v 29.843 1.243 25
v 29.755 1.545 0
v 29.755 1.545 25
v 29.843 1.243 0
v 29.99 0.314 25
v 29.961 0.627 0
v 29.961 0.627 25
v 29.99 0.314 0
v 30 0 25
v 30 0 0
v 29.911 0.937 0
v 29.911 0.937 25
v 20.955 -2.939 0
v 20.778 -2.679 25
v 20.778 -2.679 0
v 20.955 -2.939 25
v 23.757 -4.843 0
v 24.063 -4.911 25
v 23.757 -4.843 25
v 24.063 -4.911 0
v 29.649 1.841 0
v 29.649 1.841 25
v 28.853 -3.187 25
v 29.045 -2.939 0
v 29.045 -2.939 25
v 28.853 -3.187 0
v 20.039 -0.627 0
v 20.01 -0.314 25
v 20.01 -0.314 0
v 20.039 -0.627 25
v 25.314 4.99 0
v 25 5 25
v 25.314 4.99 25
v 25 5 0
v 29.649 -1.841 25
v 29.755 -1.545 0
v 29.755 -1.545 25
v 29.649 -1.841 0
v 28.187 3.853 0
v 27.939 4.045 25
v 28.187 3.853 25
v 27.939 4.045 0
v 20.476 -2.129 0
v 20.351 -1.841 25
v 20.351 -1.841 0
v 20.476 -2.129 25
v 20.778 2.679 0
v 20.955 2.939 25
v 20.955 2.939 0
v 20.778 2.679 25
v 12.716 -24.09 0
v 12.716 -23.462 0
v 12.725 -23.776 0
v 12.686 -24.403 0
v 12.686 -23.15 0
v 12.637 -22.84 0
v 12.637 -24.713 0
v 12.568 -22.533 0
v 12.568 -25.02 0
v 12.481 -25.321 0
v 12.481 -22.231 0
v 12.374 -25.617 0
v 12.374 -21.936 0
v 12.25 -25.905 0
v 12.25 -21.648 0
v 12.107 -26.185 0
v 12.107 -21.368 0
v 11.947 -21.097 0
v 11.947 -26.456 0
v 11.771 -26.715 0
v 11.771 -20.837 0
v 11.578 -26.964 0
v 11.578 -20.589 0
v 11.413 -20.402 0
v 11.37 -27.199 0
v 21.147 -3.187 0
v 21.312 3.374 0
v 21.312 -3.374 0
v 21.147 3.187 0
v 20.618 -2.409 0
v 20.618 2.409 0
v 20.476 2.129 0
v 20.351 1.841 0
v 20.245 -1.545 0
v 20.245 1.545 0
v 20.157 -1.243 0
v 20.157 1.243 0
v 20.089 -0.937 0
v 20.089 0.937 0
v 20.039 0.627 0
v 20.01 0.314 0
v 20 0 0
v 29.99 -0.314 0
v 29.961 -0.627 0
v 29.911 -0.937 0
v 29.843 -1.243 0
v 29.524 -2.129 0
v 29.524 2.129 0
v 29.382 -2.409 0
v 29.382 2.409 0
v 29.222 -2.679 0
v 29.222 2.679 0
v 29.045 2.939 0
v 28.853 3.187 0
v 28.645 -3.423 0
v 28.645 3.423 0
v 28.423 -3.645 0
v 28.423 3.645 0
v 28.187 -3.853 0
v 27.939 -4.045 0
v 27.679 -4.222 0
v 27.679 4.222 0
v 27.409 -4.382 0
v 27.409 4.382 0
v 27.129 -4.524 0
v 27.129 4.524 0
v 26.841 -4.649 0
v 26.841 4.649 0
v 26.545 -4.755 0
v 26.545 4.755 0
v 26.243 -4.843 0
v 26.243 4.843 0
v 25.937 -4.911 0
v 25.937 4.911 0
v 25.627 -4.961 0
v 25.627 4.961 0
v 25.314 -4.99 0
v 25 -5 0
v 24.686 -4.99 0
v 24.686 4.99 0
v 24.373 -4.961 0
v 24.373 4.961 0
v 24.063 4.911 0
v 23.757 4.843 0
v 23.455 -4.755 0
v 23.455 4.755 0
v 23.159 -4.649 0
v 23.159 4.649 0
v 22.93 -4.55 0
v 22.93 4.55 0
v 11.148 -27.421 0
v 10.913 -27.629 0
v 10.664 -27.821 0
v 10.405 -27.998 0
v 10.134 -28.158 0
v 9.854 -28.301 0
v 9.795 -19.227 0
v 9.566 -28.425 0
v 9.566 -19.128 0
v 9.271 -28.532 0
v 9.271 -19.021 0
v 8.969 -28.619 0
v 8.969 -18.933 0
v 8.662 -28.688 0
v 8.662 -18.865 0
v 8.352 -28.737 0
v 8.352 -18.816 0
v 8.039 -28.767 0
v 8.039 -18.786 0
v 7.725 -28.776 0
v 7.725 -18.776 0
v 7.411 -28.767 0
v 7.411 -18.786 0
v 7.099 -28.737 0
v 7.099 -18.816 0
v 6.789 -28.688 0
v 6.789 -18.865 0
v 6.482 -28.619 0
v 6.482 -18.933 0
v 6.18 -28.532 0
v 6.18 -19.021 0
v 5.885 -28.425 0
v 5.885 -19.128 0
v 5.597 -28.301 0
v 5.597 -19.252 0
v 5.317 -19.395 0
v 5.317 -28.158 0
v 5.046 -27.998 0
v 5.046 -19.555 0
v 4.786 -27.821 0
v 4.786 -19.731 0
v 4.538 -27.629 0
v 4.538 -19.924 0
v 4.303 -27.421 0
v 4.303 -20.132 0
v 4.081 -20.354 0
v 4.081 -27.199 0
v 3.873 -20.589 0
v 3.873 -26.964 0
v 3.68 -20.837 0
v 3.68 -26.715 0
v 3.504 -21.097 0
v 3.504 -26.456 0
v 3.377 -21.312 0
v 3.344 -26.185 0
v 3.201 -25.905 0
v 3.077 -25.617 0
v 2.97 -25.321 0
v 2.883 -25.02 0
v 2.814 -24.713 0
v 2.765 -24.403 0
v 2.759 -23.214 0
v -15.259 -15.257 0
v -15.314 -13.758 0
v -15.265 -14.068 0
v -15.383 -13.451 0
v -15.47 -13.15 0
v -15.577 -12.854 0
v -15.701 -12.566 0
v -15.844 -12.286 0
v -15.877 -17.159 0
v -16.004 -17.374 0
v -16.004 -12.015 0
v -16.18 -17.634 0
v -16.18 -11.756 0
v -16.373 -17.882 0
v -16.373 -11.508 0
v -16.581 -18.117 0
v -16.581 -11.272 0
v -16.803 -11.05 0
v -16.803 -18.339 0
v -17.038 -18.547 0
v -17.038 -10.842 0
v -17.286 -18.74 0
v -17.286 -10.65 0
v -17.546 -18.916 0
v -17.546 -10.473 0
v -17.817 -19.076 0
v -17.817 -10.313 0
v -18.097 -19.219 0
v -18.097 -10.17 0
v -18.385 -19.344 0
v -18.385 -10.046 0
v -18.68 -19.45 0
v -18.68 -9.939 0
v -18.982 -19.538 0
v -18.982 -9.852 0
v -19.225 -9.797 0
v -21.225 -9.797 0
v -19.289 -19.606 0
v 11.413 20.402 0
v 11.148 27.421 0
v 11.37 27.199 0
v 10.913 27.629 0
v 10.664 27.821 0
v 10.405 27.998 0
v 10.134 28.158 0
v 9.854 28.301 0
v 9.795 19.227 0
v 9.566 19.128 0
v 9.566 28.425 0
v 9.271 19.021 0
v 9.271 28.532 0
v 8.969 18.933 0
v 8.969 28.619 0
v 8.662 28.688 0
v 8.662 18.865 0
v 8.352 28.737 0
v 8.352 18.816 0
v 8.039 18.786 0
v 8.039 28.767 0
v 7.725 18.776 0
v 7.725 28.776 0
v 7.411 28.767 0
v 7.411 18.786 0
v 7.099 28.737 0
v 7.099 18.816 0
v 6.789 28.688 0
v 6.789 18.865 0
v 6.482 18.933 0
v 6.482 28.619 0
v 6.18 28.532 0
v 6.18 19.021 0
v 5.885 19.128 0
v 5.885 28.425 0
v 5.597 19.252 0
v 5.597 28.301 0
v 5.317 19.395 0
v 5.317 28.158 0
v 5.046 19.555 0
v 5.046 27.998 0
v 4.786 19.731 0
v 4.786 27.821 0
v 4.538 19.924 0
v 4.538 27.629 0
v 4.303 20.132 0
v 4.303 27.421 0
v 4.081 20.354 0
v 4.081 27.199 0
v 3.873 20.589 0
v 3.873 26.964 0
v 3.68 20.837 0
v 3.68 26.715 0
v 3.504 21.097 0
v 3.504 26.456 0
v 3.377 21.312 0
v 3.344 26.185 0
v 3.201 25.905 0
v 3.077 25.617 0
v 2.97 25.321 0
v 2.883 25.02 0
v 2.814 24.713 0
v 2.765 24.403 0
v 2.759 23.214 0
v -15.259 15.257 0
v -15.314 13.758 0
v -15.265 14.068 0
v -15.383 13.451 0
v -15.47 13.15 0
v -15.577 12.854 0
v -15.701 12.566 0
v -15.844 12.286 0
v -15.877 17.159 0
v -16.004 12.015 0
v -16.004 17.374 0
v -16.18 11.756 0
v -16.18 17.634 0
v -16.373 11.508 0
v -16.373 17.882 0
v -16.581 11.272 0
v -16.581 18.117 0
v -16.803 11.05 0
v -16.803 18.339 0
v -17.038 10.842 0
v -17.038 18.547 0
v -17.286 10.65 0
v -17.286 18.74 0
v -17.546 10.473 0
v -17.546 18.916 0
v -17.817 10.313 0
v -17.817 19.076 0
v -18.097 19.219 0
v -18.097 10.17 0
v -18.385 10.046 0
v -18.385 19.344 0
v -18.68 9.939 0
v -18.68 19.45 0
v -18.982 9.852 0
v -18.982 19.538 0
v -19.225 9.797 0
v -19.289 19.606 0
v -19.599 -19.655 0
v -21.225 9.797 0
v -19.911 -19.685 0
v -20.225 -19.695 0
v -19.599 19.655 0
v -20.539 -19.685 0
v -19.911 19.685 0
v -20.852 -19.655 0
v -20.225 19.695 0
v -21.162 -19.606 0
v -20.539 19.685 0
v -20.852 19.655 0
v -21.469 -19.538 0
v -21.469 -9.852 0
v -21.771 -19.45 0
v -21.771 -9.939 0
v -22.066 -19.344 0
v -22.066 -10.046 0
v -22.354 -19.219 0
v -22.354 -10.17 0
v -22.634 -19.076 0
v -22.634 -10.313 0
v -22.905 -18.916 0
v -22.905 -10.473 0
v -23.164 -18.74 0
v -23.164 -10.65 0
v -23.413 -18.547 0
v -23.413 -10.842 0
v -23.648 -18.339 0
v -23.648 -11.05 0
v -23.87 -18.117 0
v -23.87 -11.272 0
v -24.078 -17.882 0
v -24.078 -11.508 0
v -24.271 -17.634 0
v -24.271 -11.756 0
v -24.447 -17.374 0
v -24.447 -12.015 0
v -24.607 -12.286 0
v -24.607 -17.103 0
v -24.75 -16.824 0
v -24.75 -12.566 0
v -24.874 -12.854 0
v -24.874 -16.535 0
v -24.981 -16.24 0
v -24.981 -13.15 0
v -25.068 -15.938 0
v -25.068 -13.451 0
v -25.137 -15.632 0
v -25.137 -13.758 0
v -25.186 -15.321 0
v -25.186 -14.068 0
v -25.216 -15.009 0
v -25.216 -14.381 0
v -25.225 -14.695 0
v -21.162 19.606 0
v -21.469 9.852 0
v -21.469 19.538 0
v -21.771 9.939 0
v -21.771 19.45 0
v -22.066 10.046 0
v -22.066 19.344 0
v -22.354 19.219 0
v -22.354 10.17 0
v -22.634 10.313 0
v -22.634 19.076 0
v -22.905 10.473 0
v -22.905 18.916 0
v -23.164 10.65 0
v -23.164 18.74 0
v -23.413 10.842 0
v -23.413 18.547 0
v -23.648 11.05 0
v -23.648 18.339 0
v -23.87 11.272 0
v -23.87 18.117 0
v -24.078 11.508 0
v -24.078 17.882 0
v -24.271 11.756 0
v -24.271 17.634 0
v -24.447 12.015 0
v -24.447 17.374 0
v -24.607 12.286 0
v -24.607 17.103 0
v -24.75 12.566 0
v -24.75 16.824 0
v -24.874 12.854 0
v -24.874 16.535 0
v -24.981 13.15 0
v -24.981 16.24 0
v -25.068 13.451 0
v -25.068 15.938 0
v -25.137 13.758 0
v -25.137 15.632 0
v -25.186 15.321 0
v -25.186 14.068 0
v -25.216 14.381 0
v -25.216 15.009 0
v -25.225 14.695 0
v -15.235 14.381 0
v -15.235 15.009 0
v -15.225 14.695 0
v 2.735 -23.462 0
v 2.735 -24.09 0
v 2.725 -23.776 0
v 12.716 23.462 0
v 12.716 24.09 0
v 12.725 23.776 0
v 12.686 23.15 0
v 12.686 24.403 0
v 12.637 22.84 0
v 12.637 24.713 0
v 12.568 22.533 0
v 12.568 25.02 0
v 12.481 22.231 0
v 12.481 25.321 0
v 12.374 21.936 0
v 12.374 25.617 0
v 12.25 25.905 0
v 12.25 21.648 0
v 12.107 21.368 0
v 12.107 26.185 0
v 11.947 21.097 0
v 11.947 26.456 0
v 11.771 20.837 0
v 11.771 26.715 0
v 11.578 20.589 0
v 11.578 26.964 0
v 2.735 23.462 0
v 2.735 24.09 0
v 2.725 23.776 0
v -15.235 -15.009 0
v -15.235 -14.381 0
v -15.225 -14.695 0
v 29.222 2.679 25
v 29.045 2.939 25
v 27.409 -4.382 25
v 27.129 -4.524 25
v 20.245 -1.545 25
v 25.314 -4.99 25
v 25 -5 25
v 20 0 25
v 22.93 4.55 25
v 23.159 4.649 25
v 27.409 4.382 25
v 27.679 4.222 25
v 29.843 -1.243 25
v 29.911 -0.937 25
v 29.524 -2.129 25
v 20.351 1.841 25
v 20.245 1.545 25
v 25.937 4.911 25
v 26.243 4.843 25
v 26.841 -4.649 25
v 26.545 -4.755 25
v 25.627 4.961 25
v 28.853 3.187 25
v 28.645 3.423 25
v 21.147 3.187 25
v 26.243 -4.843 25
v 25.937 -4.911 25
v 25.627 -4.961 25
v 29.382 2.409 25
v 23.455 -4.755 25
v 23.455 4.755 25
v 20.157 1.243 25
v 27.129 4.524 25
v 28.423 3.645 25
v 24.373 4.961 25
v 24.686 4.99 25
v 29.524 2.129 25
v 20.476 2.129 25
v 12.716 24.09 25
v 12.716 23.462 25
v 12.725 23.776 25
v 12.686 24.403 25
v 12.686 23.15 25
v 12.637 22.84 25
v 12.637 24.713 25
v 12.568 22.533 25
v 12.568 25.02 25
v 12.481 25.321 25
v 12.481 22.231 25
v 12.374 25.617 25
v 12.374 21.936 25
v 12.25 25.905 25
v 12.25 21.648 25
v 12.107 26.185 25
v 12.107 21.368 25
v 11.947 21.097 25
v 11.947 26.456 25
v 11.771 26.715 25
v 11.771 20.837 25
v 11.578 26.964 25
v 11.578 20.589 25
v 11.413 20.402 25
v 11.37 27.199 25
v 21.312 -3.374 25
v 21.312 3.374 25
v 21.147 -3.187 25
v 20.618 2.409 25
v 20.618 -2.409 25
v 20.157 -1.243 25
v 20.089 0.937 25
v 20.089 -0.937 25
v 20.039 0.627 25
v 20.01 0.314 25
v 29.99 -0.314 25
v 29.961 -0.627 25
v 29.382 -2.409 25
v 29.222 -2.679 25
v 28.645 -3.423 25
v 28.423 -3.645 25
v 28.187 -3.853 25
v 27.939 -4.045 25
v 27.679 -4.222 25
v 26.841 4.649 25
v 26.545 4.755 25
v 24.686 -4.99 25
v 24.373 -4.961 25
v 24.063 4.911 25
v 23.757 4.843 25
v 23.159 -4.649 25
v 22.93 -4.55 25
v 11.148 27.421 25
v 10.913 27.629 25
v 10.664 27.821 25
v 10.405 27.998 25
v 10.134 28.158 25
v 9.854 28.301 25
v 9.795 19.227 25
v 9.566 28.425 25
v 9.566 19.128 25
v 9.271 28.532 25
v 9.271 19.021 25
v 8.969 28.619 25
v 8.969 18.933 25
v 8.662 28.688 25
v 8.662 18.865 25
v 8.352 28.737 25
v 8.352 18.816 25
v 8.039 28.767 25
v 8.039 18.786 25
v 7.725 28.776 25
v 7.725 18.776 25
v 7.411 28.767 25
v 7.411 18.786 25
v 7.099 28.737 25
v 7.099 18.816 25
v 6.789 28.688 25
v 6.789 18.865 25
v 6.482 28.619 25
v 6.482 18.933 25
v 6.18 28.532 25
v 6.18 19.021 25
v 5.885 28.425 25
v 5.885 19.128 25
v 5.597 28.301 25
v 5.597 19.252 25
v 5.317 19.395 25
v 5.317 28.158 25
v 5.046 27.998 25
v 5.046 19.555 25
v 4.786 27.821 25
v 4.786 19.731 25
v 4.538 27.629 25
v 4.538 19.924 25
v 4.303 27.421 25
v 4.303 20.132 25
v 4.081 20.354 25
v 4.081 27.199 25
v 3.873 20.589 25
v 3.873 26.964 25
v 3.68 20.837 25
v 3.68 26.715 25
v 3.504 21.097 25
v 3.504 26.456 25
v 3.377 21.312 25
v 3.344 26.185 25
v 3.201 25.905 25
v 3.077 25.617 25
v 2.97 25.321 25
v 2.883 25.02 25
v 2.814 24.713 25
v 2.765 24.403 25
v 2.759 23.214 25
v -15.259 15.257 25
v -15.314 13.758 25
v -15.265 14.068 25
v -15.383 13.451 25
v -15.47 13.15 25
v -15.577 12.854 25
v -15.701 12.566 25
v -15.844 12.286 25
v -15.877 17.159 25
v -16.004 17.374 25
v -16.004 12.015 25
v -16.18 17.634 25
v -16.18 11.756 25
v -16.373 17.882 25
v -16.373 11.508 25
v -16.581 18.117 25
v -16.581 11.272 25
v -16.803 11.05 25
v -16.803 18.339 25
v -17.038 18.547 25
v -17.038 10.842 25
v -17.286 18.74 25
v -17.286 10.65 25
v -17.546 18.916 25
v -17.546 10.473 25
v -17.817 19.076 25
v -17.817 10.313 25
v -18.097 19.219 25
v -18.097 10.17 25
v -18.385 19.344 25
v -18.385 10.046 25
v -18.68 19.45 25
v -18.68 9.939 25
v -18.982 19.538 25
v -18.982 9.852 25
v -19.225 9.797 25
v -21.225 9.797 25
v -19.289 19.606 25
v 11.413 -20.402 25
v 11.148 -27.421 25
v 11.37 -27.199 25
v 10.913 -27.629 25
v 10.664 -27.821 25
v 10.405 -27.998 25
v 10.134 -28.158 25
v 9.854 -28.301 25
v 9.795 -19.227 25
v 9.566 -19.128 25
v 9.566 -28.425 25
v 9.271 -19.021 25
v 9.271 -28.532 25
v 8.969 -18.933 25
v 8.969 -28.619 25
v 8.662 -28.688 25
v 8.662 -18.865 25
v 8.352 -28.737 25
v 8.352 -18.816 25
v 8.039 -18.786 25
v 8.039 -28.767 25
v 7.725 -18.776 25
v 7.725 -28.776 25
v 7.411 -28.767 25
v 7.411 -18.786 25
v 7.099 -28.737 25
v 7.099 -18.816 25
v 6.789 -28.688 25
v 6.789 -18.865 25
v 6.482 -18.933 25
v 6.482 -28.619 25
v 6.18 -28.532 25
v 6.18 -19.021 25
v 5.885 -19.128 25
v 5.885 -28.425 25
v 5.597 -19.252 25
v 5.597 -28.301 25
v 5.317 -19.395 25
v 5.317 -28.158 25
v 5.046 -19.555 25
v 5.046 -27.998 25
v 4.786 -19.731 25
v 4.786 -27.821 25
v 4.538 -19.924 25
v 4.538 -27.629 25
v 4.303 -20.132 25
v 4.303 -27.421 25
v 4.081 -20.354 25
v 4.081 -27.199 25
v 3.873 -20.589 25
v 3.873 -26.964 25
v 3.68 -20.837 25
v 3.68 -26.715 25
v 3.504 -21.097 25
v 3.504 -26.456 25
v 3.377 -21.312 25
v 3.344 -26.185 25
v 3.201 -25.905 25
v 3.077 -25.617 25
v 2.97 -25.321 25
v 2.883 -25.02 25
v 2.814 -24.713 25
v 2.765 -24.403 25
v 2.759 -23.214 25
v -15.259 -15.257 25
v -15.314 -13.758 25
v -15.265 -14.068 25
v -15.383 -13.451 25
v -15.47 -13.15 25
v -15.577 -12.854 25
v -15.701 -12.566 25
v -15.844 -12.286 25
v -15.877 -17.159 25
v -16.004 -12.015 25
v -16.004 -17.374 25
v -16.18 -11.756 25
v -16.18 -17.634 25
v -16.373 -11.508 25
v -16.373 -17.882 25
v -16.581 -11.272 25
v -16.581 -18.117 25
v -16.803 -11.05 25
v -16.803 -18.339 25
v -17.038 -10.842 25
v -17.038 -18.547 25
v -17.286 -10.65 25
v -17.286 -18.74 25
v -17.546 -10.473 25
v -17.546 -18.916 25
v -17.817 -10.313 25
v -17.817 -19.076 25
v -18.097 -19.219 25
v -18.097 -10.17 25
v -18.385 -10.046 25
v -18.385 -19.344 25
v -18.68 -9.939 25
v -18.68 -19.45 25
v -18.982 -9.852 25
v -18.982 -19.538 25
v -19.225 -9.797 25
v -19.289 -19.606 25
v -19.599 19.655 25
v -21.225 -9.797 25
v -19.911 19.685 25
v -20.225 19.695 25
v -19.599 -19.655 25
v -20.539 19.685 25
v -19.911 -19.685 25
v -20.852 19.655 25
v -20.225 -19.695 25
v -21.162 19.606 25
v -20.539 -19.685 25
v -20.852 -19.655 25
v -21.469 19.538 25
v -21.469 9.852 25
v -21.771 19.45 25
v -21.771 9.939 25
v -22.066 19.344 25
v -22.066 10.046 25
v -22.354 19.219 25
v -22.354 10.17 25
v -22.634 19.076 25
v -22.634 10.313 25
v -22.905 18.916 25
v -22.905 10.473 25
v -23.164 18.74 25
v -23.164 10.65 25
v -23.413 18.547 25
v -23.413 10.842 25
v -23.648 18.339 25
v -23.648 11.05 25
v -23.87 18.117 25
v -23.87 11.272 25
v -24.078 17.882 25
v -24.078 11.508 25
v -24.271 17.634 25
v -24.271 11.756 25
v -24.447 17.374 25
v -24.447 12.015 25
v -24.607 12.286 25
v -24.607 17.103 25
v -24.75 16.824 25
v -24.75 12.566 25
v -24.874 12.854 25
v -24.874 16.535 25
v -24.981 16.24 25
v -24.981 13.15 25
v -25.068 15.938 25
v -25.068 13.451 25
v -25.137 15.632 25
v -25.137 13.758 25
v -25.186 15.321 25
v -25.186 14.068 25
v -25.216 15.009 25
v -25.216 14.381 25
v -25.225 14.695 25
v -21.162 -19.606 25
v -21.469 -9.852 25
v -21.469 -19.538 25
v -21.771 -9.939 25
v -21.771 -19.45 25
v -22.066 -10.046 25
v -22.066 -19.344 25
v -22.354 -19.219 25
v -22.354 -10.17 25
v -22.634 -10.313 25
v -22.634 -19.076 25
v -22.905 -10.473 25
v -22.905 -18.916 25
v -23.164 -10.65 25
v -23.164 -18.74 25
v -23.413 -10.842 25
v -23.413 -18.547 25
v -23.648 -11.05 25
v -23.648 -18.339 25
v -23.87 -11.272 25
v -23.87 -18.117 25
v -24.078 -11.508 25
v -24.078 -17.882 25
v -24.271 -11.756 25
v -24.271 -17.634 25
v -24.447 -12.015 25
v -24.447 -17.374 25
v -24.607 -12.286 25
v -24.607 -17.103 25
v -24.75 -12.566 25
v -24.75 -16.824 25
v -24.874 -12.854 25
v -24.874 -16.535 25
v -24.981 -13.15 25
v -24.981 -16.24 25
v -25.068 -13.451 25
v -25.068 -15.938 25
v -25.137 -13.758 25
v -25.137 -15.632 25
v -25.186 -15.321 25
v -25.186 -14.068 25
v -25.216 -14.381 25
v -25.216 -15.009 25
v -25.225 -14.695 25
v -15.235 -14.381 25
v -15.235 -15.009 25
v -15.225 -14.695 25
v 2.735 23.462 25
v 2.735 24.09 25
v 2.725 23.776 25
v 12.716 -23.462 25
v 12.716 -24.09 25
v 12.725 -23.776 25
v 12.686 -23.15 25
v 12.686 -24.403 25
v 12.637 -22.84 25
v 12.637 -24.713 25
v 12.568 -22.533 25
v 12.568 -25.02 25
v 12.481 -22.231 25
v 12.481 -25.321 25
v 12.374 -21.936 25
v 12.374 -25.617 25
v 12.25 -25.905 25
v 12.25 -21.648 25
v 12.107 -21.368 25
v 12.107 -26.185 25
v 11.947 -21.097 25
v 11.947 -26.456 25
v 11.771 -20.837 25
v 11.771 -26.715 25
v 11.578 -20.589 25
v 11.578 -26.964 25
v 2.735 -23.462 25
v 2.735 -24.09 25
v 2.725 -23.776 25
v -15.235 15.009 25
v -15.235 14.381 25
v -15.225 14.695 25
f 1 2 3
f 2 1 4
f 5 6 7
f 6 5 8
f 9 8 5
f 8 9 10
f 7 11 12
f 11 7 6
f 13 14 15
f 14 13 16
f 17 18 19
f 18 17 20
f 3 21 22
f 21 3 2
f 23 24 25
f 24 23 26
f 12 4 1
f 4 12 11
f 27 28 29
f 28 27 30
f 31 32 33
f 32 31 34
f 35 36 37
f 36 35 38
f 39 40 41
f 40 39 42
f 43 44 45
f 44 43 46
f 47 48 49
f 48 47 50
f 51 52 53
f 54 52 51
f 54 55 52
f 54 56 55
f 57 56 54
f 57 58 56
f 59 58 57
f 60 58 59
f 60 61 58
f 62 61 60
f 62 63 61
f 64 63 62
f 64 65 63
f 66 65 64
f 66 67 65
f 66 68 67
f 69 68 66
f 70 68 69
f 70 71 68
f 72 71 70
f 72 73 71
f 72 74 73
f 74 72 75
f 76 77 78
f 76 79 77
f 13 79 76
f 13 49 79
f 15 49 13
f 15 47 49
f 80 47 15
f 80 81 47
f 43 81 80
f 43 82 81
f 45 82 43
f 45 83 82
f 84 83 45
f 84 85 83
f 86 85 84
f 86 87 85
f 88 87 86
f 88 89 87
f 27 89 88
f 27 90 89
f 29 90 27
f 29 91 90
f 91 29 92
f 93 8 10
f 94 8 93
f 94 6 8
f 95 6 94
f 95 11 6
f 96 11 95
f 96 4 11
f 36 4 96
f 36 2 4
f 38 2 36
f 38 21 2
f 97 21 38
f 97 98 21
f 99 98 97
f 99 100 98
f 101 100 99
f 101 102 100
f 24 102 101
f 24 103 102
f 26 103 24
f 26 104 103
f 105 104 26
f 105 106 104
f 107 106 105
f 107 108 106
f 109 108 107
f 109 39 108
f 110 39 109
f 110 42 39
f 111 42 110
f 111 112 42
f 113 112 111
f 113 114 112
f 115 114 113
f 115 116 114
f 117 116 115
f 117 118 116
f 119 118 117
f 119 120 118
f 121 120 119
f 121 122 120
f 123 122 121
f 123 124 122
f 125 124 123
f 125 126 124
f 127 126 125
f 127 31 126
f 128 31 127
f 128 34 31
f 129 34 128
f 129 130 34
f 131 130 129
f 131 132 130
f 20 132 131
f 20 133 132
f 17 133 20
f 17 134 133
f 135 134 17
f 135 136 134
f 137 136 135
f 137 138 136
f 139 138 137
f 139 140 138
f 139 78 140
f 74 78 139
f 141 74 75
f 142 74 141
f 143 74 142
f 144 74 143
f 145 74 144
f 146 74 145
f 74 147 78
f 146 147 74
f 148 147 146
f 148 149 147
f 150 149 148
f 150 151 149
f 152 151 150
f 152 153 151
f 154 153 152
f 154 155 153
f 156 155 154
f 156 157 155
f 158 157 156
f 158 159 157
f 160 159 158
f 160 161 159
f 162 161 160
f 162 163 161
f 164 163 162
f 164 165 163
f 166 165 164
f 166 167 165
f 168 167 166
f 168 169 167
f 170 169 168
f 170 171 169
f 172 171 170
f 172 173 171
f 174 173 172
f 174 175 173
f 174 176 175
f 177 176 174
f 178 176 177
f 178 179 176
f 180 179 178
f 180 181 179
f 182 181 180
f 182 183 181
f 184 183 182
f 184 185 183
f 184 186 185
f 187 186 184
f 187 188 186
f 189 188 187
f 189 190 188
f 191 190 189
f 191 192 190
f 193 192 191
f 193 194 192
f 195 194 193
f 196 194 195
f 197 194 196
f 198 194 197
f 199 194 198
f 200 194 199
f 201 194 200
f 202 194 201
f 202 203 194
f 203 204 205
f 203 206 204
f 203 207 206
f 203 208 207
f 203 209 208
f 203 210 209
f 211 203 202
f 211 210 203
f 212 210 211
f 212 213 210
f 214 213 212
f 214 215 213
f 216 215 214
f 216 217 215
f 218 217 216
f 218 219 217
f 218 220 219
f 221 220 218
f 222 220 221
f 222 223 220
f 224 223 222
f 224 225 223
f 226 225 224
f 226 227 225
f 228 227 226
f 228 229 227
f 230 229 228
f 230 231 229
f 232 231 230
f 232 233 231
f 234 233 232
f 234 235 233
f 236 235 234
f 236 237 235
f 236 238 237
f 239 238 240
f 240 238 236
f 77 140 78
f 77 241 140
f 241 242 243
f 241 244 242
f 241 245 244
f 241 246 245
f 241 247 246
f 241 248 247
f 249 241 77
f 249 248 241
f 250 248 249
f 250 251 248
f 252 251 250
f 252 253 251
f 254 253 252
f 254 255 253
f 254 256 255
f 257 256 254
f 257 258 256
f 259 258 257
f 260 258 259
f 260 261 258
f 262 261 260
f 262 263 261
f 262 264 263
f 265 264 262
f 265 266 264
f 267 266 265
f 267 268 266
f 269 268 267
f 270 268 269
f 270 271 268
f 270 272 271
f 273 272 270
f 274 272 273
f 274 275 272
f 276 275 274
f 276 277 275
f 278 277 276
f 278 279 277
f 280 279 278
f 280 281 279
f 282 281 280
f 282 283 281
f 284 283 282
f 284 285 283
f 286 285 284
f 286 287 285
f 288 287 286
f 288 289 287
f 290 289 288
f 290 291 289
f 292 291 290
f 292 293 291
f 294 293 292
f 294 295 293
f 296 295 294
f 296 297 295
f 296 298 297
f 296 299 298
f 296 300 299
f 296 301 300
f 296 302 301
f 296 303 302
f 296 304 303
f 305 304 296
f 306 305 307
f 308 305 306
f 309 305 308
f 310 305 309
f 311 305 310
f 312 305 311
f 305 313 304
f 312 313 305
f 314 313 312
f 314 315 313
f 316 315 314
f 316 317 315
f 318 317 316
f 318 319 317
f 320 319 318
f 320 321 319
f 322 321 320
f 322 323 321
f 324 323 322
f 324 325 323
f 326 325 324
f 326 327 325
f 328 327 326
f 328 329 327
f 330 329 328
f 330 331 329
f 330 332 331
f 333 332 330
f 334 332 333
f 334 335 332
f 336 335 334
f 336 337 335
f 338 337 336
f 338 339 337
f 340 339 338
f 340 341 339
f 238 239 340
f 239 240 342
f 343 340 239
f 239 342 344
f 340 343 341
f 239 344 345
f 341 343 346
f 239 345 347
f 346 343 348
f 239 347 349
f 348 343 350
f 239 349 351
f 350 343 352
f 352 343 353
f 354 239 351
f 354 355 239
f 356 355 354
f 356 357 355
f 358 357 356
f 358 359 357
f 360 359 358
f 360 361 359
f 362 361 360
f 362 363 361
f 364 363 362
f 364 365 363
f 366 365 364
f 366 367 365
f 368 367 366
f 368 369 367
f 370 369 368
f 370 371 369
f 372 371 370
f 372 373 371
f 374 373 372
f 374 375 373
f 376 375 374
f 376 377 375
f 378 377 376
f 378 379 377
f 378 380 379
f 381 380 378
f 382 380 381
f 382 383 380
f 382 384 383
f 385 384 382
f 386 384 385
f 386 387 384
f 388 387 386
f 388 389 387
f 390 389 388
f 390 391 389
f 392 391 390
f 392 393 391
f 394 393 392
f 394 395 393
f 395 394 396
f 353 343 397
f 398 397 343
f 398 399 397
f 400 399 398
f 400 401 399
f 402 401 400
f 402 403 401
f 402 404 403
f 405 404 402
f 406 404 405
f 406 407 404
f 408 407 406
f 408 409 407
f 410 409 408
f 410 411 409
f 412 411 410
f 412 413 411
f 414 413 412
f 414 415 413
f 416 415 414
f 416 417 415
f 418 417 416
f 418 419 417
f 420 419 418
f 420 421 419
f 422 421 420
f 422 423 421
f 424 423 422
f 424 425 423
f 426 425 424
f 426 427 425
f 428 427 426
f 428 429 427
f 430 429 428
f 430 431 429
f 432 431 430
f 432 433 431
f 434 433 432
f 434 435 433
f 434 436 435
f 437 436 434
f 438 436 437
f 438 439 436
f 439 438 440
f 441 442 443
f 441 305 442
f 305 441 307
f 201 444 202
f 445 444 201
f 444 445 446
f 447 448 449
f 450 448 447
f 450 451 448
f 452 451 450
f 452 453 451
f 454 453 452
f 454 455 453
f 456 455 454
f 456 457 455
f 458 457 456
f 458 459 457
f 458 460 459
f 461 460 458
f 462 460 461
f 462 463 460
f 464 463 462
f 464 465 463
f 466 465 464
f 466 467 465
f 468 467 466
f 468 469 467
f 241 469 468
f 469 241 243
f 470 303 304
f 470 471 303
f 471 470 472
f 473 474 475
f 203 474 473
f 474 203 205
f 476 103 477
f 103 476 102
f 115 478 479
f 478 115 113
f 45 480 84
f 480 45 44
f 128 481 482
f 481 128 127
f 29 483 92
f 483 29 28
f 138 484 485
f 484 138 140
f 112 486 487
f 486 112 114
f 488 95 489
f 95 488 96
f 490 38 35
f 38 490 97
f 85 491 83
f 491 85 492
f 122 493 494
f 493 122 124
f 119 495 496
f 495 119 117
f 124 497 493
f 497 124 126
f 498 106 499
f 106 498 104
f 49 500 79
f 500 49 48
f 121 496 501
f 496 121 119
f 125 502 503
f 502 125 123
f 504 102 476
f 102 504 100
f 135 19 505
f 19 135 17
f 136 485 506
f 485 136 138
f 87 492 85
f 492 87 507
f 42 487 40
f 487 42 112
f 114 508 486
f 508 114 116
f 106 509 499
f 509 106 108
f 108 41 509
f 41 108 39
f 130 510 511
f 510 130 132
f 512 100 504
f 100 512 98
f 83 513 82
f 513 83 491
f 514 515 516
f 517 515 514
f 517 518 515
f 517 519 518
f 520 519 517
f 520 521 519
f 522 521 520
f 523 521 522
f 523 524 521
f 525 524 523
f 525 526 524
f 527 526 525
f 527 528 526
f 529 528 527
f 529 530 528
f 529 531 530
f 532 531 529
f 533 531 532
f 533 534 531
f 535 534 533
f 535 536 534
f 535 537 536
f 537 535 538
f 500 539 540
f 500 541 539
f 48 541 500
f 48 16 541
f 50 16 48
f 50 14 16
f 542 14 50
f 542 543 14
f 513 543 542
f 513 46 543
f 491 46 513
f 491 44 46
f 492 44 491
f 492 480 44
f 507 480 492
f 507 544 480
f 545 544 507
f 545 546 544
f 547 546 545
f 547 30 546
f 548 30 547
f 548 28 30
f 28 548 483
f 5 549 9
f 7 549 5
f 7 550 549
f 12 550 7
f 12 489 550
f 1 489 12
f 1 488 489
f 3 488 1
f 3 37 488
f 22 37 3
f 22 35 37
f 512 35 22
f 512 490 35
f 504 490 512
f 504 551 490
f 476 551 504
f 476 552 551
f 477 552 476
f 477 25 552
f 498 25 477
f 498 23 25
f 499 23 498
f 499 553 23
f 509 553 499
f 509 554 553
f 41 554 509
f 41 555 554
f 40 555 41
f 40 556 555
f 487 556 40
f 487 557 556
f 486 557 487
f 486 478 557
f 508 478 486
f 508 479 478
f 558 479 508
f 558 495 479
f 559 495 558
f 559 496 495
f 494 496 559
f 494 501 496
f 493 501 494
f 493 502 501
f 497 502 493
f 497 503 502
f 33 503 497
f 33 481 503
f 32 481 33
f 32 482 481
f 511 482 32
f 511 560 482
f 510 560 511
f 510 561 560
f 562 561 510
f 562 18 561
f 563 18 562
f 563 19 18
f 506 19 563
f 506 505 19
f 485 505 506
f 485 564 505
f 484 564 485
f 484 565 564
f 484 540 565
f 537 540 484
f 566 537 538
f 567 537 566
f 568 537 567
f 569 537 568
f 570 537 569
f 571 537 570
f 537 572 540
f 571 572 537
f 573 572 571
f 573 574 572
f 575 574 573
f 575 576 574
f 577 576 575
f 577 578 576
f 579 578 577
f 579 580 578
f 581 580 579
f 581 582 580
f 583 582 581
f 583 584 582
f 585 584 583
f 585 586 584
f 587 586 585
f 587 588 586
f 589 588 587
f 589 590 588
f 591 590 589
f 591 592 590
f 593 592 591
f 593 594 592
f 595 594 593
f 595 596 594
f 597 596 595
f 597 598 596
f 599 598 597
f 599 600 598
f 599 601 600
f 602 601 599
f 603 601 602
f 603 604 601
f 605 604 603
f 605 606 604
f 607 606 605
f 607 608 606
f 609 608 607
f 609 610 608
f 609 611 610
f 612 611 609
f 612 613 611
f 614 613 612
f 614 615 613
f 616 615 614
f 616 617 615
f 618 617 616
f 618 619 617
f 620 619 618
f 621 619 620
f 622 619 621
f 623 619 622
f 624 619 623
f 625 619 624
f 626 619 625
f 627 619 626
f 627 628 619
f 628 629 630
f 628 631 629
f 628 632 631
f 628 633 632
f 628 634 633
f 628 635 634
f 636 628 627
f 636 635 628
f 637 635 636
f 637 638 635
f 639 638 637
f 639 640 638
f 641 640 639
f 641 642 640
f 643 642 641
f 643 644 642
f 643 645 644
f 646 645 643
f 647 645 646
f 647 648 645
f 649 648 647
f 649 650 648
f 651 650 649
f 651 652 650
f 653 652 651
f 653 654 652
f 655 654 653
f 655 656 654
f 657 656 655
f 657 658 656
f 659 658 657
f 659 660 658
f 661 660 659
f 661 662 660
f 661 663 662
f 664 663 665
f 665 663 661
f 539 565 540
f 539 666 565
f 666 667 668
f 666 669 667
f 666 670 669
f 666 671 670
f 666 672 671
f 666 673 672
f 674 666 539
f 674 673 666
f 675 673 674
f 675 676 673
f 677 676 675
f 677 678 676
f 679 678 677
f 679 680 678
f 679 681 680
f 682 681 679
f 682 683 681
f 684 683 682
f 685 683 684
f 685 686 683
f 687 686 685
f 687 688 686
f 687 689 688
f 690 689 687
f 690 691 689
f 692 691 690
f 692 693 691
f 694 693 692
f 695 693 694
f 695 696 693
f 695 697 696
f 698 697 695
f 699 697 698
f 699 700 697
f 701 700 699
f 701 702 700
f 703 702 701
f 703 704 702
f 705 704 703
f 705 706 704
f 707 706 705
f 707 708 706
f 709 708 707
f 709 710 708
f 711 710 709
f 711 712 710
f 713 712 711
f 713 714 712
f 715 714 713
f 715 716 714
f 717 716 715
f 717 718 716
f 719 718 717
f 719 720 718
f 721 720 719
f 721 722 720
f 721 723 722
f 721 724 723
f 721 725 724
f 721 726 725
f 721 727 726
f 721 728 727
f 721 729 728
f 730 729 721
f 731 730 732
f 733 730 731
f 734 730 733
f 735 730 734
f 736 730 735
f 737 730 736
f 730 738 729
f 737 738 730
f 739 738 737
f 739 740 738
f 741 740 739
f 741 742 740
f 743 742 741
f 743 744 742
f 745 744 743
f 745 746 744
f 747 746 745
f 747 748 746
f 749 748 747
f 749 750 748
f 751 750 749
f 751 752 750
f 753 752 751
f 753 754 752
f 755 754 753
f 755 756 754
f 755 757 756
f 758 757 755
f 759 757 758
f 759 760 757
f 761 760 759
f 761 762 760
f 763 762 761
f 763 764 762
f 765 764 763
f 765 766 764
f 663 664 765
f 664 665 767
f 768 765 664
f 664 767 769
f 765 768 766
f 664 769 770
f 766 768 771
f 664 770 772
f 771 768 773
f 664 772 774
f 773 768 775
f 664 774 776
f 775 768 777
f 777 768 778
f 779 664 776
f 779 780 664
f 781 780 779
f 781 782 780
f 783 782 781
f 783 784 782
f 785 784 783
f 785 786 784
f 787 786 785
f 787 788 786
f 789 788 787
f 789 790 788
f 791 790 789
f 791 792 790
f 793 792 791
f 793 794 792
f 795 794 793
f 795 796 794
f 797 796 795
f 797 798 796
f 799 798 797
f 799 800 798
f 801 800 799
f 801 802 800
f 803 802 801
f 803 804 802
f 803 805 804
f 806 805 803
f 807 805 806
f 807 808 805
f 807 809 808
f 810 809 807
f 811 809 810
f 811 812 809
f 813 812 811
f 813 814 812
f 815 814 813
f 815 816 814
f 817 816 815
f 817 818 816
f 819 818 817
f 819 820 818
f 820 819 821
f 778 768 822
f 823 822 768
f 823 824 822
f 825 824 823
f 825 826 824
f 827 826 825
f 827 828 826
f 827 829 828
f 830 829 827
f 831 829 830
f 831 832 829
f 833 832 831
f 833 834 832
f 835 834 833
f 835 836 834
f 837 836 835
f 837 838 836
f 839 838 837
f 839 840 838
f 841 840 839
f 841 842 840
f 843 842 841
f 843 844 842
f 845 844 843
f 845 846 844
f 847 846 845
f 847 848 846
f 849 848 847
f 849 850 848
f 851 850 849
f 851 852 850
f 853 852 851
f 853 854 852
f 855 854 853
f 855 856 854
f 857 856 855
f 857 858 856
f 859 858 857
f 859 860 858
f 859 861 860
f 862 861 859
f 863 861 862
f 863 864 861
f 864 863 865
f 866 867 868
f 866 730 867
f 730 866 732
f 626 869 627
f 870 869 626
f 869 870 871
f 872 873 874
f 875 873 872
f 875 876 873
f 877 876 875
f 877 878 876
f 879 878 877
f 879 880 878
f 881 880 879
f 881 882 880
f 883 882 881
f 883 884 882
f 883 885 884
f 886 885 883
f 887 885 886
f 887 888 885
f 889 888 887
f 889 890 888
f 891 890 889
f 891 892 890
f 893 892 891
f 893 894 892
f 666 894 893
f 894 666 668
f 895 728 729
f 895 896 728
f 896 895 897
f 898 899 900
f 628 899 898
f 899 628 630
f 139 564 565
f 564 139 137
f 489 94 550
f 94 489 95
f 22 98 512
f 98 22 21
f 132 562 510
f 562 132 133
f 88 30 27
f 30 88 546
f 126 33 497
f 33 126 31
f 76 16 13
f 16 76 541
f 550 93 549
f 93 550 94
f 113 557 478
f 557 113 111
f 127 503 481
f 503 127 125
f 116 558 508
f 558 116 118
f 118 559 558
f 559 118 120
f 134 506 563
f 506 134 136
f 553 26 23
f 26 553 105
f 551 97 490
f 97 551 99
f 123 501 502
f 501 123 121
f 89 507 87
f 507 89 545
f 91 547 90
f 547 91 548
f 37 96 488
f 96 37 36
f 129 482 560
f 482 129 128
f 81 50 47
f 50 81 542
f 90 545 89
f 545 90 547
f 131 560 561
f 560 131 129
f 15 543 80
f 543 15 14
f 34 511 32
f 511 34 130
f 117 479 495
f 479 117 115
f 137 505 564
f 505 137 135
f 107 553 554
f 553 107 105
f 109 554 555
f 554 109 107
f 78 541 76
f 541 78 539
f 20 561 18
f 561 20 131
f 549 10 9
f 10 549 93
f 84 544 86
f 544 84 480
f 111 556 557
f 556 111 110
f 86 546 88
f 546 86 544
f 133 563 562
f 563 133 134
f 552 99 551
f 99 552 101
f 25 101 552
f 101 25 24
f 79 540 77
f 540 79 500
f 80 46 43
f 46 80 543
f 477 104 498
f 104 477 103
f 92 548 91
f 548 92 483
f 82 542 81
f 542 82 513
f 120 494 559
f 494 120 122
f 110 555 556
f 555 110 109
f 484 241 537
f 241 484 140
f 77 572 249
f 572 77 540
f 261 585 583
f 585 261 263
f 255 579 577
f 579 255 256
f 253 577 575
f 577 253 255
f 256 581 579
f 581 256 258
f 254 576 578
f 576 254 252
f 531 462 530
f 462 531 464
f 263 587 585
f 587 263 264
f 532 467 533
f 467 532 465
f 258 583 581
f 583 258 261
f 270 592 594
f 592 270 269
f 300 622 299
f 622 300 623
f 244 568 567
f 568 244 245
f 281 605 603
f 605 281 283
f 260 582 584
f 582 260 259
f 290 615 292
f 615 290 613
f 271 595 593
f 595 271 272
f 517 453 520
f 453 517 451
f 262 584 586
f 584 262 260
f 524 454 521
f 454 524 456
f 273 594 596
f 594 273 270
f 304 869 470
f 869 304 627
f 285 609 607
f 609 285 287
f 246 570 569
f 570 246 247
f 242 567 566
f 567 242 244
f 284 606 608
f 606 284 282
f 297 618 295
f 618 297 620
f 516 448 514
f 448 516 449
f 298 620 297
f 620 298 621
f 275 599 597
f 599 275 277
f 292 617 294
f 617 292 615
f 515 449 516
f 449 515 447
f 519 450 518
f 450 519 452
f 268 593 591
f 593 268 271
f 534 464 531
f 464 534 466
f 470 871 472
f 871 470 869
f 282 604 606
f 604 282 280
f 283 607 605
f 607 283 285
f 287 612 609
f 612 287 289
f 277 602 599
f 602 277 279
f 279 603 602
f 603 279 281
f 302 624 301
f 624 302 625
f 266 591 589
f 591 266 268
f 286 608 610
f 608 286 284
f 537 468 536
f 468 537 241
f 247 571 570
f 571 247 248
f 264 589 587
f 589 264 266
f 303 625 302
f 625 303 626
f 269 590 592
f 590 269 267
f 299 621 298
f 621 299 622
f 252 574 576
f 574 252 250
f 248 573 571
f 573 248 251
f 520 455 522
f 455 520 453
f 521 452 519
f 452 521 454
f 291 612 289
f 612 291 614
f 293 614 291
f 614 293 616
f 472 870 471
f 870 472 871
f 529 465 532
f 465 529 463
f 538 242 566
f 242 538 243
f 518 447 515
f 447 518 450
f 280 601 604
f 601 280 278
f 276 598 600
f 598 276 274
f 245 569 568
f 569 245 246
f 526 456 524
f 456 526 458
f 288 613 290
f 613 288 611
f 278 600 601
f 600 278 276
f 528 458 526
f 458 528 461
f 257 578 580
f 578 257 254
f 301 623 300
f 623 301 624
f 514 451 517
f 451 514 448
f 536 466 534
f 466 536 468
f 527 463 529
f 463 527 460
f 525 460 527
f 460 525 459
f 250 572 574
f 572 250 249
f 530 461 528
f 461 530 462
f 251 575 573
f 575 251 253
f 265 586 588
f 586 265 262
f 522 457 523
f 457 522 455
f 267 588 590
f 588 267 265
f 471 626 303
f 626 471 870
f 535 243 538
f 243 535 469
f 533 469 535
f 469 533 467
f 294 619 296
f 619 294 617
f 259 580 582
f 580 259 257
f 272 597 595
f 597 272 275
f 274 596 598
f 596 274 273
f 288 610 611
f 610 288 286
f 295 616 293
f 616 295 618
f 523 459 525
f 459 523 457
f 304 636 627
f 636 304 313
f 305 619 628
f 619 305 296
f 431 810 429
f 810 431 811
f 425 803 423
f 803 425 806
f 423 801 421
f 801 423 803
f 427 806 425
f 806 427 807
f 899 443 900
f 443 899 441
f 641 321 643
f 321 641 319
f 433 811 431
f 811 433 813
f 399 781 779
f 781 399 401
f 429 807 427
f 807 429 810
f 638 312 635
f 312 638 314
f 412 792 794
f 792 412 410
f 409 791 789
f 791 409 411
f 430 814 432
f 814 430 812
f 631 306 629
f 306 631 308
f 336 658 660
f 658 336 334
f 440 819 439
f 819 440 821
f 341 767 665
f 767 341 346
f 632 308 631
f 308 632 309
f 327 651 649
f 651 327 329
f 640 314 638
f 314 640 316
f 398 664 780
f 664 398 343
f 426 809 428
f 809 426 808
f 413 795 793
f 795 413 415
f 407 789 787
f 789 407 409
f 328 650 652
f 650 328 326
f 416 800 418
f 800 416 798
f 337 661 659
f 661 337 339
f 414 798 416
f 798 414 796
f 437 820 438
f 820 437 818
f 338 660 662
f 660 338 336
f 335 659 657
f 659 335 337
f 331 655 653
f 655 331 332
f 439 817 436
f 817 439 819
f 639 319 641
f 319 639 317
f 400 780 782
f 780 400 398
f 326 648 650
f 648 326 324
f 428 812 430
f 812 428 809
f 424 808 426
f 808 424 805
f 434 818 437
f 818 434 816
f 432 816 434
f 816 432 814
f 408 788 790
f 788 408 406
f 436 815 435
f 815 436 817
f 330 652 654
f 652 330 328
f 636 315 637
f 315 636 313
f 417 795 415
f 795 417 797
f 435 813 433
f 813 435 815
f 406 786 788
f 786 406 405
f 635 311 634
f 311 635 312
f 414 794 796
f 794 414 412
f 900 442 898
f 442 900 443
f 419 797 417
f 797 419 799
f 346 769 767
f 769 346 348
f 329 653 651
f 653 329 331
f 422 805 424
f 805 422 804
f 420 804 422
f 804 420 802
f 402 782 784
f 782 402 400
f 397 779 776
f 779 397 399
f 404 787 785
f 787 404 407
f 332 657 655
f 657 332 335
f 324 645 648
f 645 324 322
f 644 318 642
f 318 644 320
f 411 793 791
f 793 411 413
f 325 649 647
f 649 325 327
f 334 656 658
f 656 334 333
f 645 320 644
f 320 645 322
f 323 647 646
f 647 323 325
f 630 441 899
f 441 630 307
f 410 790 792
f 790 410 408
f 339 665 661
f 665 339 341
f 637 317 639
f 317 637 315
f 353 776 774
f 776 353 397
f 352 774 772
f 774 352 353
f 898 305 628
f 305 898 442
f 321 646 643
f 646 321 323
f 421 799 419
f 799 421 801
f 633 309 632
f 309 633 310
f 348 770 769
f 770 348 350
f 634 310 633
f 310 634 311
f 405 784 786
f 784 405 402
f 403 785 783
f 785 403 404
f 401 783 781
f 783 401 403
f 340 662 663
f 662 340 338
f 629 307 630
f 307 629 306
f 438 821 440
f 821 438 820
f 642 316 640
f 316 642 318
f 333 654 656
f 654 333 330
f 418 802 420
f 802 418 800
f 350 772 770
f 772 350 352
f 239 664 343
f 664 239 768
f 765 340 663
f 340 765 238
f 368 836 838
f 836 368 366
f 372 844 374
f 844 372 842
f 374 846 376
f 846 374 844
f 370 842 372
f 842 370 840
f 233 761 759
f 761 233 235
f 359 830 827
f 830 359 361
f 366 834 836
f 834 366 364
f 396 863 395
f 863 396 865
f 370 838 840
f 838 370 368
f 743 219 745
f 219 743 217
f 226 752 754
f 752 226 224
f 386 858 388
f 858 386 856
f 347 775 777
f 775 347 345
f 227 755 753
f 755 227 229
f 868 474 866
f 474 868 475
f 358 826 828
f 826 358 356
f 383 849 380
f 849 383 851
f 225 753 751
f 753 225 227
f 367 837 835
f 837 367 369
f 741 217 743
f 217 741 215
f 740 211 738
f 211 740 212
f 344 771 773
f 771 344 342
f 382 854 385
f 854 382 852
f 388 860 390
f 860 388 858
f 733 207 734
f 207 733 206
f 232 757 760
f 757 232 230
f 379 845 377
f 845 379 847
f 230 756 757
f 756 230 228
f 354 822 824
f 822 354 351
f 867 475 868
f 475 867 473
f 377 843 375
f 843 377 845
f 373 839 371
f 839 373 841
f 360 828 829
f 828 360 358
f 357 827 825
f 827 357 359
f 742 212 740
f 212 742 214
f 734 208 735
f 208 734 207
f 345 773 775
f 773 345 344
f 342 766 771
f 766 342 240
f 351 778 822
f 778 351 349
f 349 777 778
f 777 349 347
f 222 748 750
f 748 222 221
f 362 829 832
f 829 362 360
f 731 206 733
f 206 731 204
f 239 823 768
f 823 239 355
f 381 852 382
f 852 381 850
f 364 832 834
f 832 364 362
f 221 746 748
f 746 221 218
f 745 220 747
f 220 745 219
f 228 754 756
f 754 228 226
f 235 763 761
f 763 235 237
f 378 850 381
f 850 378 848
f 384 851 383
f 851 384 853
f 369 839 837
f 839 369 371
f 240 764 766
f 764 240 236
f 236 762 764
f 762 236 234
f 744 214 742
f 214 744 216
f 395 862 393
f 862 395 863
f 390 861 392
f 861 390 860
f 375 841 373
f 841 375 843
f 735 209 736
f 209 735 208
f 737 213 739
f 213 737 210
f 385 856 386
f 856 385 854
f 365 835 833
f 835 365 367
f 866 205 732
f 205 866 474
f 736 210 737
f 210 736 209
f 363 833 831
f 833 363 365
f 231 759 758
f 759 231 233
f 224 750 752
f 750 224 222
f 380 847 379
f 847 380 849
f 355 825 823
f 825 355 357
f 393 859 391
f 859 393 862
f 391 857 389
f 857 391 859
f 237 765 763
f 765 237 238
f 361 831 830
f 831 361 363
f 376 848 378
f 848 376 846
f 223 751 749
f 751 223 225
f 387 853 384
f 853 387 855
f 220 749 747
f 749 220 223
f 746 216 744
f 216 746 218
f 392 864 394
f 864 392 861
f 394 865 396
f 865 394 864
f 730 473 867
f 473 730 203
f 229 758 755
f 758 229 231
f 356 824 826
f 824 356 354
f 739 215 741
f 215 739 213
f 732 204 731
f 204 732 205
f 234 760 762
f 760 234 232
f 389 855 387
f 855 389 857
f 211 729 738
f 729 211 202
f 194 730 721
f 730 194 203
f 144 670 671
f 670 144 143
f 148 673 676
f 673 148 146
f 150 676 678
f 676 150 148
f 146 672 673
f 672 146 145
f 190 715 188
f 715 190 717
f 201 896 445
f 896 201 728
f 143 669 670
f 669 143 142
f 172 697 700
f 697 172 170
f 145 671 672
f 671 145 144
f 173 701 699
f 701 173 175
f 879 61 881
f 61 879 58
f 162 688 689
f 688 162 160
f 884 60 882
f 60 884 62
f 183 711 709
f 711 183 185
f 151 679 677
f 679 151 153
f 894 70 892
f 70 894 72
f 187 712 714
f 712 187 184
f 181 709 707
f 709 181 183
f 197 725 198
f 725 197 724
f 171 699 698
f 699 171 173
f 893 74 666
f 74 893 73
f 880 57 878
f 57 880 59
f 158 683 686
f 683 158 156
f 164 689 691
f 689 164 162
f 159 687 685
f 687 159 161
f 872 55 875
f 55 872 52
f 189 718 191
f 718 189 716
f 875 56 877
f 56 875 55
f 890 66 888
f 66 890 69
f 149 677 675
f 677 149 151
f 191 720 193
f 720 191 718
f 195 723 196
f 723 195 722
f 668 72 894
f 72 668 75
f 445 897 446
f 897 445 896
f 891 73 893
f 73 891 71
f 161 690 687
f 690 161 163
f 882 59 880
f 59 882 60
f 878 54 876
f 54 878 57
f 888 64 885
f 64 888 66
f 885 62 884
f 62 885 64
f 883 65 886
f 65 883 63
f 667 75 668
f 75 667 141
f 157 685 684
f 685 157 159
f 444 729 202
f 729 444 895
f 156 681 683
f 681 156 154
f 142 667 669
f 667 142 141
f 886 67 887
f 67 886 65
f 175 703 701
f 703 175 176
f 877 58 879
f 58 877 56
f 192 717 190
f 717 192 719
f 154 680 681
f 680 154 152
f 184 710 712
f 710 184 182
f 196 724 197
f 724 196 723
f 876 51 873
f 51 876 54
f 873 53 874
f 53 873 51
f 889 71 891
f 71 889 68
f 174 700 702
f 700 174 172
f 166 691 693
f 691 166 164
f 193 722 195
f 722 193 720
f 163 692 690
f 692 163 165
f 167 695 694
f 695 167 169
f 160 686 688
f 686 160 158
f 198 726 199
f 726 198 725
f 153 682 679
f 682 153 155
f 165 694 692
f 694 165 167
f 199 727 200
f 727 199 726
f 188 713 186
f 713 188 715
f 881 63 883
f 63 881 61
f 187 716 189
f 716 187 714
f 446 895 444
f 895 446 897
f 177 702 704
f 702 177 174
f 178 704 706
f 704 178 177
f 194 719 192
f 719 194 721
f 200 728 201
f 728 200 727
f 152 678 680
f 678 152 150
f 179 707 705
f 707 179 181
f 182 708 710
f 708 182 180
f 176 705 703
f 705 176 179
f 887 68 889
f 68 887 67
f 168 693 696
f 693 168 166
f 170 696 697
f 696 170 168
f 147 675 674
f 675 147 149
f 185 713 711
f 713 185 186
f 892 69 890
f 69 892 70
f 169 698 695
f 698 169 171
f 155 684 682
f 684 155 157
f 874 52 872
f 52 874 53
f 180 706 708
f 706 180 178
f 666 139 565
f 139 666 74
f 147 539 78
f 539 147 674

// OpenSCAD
// RING 

//Adjust the radius.
r_cyl 		= 5; // [1:30]
//Adjust the height.
h_cyl 		= 25; // [1:50]

//Adjust the radius.
r_ring 		= 25; // [1:100]
//Number of cylinders.
v_nbr_cyl 	= 5; // [1:50]
//Adjust the thickness.
e_cube		= 2; // [1:50]


$fn=100;

for (nb = [0: v_nbr_cyl]) 
{
    rotate(360*nb/v_nbr_cyl,[0,0,1])
    translate([r_ring, 0, 0])
    {		
    	cylinder(r= r_cyl, h= h_cyl);
		rotate(90+180/v_nbr_cyl,[0,0,1])
		translate(v=[0,-e_cube/2,0])
    	cube([2*cos((180/v_nbr_cyl)-90)*r_ring,e_cube,h_cyl]);   
    }
}
